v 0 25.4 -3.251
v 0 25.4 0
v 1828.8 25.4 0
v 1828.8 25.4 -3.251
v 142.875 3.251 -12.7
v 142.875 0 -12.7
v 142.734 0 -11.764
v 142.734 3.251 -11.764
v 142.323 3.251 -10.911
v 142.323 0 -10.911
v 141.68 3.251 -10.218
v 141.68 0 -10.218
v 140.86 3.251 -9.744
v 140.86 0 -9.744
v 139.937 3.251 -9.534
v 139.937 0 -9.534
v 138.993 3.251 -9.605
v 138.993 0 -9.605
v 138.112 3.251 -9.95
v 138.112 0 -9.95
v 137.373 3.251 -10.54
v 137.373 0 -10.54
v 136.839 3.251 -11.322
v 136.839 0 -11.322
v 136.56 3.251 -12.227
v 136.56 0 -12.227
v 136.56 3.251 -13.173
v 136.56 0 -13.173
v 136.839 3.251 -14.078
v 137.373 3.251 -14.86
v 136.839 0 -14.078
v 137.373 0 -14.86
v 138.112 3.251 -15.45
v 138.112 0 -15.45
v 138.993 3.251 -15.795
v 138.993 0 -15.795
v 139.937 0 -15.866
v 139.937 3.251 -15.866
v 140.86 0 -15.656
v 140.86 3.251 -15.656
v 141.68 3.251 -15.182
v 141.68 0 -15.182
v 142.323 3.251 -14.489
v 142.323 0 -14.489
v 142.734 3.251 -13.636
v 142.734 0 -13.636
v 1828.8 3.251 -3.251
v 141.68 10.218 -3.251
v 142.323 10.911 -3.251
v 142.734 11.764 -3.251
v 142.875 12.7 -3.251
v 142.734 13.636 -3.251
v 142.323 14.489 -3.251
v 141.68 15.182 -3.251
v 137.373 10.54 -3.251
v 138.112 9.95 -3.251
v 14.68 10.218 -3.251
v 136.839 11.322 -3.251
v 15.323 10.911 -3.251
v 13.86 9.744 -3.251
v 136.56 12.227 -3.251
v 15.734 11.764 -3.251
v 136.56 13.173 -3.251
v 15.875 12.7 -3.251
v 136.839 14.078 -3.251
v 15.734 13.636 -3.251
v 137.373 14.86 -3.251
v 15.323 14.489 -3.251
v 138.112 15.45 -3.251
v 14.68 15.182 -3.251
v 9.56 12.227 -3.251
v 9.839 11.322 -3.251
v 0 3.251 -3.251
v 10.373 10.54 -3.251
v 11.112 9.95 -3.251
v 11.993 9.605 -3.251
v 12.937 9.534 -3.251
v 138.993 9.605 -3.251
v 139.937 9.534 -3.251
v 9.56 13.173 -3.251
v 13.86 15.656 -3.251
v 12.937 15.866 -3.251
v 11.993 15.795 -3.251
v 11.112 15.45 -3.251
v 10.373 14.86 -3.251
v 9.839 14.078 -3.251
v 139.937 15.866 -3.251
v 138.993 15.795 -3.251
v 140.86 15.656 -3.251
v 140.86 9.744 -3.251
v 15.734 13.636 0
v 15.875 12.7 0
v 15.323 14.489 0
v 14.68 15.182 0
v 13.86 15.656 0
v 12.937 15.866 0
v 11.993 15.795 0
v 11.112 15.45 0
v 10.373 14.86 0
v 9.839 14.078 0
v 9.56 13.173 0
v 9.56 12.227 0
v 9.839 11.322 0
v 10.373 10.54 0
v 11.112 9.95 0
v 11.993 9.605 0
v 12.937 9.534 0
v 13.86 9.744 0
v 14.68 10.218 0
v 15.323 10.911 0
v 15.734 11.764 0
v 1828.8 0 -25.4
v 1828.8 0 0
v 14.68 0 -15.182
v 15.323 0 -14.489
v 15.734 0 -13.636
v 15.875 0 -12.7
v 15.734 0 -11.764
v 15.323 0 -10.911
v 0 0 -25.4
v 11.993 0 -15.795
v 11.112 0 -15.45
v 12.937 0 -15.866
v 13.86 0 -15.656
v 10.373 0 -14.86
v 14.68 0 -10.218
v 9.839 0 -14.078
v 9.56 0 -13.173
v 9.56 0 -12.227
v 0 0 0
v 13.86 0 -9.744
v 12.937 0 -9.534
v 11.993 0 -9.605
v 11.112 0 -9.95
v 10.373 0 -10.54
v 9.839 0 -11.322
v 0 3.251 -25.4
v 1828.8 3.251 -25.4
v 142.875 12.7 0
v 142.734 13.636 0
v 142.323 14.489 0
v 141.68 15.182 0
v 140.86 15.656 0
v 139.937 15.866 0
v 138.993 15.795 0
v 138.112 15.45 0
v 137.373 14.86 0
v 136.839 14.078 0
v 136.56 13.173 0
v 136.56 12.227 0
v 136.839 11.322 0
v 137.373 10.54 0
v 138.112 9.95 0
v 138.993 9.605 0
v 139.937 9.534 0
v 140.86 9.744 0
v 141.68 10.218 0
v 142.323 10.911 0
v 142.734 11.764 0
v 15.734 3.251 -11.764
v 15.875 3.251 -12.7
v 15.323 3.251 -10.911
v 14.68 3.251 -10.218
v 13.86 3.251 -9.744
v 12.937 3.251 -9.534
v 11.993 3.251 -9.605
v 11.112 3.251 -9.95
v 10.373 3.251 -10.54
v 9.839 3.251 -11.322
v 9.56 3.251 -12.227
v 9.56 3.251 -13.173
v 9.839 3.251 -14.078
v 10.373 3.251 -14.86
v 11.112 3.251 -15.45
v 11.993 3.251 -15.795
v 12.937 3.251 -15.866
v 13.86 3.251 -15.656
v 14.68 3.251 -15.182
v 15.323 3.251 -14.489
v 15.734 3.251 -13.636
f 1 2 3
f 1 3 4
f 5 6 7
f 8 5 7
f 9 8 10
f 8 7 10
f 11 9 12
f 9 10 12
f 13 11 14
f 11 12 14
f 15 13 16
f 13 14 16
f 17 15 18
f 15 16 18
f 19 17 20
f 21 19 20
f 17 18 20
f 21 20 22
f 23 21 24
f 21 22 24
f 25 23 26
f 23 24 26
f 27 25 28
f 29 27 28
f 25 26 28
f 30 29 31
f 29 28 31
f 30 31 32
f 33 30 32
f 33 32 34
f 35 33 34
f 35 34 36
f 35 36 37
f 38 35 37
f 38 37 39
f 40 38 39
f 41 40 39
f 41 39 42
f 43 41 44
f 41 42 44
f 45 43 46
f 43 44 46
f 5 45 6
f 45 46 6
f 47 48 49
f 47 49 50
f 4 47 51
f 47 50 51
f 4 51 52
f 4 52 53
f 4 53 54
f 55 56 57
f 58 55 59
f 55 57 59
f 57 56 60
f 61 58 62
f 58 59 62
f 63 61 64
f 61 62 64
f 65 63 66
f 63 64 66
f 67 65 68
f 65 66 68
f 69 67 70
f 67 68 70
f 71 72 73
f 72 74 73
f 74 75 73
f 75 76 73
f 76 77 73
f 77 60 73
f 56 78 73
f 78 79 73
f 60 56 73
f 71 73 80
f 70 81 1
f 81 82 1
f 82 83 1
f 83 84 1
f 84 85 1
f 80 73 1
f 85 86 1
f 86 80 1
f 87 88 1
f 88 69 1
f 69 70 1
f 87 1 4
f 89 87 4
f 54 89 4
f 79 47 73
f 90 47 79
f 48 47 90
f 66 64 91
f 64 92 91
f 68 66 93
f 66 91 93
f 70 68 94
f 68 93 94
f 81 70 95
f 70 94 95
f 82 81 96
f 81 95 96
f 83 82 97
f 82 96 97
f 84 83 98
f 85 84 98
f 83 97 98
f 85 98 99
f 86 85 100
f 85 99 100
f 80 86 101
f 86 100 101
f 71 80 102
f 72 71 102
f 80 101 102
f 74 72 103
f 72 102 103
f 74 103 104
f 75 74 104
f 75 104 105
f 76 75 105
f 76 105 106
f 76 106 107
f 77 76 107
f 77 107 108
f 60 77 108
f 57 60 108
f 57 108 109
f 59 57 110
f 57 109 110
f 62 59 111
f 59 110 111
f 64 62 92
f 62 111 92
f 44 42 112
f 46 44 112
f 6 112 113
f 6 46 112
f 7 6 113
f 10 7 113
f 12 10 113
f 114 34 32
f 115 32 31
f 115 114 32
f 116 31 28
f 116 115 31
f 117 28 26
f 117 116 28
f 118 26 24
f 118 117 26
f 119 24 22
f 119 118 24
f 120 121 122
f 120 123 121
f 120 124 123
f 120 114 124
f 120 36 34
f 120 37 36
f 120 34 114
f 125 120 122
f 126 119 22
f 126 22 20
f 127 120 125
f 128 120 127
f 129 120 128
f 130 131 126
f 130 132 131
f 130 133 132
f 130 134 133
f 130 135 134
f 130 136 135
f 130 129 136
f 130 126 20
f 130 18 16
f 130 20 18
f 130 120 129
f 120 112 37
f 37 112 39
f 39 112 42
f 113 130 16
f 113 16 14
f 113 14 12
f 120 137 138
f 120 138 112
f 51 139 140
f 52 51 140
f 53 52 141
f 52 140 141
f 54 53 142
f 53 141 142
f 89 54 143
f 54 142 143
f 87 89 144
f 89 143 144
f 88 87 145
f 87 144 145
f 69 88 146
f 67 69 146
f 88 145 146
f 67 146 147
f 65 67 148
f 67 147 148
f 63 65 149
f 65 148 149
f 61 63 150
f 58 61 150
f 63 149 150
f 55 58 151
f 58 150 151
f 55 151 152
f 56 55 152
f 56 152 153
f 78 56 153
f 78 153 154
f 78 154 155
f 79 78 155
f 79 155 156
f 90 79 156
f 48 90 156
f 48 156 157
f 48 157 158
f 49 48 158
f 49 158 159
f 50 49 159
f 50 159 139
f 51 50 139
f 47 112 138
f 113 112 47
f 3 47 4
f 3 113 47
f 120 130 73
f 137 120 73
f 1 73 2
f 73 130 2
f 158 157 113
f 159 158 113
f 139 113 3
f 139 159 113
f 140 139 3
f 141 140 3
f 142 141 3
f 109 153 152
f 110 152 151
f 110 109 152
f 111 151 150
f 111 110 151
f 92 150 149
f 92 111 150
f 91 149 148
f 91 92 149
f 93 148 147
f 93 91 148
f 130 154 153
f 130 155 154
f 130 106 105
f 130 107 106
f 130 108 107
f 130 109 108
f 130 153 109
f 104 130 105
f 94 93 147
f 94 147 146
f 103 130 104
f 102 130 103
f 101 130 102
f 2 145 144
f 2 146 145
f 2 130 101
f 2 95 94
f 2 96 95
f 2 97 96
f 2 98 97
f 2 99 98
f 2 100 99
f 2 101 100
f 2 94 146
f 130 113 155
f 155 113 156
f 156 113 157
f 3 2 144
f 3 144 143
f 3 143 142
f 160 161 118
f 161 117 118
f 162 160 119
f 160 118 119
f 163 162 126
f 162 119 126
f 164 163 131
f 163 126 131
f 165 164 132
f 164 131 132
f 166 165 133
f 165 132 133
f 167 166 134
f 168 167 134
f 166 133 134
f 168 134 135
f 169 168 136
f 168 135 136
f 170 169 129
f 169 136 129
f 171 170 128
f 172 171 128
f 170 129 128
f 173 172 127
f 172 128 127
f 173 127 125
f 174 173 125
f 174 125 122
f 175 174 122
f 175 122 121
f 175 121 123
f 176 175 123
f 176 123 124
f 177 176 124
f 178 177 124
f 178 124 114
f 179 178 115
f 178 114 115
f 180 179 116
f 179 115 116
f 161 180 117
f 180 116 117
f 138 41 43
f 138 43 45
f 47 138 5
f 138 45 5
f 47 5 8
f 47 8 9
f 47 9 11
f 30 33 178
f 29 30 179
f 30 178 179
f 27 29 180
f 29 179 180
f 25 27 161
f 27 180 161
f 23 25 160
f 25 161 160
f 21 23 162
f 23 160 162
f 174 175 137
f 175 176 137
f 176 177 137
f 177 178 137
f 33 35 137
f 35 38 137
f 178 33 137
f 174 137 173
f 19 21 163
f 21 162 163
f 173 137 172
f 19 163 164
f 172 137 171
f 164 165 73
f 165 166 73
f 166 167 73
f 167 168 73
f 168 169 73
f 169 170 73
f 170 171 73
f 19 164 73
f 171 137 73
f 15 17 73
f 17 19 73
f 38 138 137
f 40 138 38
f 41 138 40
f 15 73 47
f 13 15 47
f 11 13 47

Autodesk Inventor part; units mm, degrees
ref_plane "YZ Plane" through (0, 0, 0) normal (1, 0, 0) x (0, 1, 0)
ref_plane "XZ Plane" through (0, 0, 0) normal (0, 1, 0) x (-1, 0, 0)
ref_plane "XY Plane" through (0, 0, 0) normal (0, 0, 1) x (1, 0, 0)
sketch "Sketch1" plane through (0, 0, 0) normal (1, 0, 0) x (0, 1, 0)
  line L0 (0, 0) -> (25.4, 0)
  line L1 (3.2512, -25.4) -> (0, -25.4)
  line L2 (0, -25.4) -> (0, 0)
  line L3 (3.2512, -3.2512) -> (25.4, -3.2512)
  line L4 (3.2512, -25.4) -> (3.2512, -3.2512)
  line L5 (25.4, 0) -> (25.4, -3.2512)
  dimension "d0" = 25.4
  dimension "d1" = 3.2512
extrude "Extrusion1" add sketch "Sketch1" along normal blind 1828.8
sketch "Sketch2" plane through (0, 0, 0) normal (0, 0, 1) x (1, 0, 0)
  line L0 (0, 0) -> (0, 25.4) projected
  line L1 (0, 12.7) -> (44.4361, 12.7) construction
  circle A0 centre (12.7, 12.7) radius 3.175
  circle A1 centre (139.7, 12.7) radius 3.175
  dimension "d4" = 6.35
  dimension "d5" = 12.7
  dimension "d6" = 139.7
extrude "Extrusion2" cut sketch "Sketch2" against normal blind 1828.8
sketch "Sketch3" plane through (0, 0, -25.4) normal (0, -1, 0) x (1, 0, 0)
  line L0 (0, 0) -> (0, 25.4) projected
  line L1 (0, 12.7) -> (119.8367, 12.7) construction
  circle A0 centre (12.7, 12.7) radius 3.175
  circle A1 centre (139.7, 12.7) radius 3.175
  dimension "d9" = 6.35
  dimension "d10" = 12.7
  dimension "d11" = 139.7
extrude "Extrusion3" cut sketch "Sketch3" against normal blind 1828.8
properties part number "Upper Long L"
